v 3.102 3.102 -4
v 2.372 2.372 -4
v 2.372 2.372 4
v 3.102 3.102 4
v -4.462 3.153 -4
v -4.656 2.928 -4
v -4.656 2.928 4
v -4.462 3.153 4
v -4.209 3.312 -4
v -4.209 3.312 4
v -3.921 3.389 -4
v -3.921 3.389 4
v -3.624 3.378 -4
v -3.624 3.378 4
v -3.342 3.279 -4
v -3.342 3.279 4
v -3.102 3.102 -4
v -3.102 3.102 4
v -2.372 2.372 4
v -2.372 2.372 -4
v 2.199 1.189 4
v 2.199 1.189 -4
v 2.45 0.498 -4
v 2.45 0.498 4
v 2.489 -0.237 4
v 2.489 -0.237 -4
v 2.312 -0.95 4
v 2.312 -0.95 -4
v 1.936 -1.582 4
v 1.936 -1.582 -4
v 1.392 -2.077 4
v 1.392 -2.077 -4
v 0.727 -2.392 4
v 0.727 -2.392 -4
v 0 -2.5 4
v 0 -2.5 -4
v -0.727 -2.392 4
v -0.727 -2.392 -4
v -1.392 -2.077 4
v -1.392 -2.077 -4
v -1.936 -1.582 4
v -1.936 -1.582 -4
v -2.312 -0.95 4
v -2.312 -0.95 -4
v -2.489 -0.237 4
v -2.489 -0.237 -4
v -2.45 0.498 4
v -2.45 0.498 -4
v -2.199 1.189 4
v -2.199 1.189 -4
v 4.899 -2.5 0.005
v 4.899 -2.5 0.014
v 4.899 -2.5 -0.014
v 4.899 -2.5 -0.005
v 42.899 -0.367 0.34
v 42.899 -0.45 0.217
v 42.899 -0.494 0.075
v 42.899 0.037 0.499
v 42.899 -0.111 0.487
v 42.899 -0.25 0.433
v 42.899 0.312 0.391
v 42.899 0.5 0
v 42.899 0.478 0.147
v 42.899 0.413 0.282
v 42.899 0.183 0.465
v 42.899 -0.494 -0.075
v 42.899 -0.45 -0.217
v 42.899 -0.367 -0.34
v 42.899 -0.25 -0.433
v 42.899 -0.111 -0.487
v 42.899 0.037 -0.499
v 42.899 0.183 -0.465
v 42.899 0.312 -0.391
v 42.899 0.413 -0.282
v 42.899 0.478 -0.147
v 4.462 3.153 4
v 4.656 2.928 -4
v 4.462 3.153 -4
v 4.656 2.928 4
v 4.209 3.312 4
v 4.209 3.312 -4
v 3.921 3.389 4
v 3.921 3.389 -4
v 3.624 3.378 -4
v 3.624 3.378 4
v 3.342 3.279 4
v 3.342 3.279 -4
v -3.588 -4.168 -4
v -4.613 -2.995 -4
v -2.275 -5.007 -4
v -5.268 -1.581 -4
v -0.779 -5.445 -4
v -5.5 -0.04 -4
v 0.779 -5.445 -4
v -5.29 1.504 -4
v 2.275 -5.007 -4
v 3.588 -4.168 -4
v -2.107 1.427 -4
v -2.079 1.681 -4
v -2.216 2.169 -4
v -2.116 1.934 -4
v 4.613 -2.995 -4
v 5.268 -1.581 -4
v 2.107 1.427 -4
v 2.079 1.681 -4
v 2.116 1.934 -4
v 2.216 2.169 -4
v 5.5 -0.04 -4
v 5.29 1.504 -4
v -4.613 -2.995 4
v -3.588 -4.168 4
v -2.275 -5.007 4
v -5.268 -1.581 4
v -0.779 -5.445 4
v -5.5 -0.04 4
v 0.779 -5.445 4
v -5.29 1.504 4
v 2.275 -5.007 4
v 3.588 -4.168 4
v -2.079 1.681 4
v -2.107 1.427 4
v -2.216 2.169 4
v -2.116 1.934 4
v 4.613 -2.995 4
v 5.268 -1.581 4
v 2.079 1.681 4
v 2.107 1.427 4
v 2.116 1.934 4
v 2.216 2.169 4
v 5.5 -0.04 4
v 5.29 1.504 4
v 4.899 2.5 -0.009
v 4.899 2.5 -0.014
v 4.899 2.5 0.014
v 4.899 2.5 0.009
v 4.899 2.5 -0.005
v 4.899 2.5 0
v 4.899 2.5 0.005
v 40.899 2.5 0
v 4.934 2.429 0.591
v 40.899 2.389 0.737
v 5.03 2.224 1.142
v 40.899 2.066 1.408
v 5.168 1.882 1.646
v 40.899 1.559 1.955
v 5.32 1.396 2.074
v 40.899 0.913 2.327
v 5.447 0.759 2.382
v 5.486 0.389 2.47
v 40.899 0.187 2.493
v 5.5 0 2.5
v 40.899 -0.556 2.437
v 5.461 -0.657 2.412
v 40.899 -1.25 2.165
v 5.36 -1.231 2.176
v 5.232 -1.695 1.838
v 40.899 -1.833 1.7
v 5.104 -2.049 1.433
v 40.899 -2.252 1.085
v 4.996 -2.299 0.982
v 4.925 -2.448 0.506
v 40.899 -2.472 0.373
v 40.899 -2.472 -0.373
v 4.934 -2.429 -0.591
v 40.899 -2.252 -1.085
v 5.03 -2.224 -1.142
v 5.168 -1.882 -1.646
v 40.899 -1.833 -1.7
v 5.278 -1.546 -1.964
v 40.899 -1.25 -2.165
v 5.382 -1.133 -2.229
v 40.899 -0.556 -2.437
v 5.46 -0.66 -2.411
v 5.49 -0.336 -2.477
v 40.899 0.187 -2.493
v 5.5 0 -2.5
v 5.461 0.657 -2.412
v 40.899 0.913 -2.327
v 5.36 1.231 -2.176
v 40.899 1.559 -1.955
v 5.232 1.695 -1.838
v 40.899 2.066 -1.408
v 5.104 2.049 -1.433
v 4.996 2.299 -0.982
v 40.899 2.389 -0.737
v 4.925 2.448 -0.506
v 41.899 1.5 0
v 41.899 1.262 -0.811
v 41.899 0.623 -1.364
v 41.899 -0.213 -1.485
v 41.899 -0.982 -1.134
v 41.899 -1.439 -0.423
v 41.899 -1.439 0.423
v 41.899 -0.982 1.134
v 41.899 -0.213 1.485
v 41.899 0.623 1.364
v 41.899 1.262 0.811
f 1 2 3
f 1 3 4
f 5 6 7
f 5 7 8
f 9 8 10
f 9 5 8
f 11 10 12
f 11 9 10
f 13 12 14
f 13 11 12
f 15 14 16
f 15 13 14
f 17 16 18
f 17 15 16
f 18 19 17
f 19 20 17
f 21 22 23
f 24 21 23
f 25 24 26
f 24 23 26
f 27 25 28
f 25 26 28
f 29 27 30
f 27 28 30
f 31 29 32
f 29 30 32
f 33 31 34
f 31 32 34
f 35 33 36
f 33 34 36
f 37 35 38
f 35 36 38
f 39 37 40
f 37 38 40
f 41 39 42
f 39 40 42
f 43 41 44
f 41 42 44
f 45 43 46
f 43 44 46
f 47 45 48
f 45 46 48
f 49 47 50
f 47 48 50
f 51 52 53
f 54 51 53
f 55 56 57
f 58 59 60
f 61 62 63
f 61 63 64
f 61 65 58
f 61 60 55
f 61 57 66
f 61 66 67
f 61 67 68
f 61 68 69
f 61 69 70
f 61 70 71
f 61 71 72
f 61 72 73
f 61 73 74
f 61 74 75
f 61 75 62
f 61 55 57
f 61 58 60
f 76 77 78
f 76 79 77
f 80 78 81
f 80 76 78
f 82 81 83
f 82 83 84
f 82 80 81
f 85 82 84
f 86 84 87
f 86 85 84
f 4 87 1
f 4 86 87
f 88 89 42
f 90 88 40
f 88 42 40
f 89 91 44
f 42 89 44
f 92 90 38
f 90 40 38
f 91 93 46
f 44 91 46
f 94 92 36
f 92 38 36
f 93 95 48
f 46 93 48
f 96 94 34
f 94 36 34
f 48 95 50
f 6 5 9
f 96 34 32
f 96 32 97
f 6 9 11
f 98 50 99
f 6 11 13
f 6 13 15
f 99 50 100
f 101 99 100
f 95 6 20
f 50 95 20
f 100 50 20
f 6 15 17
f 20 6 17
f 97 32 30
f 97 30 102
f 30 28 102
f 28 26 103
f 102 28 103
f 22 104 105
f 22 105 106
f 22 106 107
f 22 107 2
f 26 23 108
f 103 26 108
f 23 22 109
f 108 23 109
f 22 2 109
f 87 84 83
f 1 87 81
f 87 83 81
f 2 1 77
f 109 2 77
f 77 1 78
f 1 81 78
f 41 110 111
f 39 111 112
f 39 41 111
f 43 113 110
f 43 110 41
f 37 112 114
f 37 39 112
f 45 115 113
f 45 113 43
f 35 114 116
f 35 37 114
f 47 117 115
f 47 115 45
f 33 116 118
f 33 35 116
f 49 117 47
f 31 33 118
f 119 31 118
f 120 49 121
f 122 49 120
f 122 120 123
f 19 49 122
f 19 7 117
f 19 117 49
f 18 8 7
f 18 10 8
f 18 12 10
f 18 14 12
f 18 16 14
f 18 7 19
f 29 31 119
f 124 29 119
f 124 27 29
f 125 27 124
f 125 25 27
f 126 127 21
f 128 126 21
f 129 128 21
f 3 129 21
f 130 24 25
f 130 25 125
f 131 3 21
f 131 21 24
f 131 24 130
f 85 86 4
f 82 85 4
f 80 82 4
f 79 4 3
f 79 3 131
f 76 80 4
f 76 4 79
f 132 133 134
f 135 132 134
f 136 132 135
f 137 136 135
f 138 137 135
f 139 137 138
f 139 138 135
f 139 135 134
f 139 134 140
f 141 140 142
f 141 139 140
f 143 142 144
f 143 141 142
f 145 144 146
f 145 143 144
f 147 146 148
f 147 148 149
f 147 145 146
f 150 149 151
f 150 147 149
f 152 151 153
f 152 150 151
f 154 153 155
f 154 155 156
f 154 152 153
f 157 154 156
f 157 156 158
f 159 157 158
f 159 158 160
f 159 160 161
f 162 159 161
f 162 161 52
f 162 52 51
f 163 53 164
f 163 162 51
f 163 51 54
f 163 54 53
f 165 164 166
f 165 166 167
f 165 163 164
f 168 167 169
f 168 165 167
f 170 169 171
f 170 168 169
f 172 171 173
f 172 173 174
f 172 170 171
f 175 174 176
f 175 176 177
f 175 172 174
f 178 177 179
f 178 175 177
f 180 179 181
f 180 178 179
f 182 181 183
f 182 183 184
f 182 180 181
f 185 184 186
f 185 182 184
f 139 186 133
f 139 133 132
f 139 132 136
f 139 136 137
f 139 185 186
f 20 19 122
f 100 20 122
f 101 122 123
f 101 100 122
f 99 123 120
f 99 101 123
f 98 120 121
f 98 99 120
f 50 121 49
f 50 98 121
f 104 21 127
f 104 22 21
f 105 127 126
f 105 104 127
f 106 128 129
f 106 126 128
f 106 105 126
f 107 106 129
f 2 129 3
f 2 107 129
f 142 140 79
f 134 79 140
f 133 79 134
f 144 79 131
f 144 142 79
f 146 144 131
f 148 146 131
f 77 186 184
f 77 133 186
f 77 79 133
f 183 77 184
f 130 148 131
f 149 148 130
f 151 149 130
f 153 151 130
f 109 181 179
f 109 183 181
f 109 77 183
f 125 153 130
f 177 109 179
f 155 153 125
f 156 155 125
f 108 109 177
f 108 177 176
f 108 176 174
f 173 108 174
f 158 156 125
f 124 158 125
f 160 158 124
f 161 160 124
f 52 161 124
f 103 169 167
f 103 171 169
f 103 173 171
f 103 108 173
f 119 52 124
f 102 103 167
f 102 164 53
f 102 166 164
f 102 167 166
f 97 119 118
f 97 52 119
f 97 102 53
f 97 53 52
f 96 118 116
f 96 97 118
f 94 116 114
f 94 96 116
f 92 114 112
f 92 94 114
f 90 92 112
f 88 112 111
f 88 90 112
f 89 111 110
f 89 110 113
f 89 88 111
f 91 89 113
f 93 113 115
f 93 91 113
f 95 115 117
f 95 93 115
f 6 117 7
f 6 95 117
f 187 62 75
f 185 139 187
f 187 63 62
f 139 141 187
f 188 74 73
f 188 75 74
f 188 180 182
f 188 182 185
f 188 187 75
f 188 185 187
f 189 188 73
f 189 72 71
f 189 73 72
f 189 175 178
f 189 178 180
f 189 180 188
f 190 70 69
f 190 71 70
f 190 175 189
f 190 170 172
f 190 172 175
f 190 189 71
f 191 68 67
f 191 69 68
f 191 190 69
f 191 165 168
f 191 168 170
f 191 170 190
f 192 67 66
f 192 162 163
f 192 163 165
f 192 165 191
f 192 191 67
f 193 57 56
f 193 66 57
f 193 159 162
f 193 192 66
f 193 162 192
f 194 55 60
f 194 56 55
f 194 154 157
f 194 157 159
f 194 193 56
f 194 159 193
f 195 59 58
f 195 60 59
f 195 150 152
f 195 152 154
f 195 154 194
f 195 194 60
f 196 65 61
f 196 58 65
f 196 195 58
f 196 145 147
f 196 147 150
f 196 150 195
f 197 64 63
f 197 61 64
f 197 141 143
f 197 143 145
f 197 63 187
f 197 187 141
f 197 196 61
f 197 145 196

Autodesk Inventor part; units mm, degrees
ref_plane "YZ Plane" through (0, 0, 0) normal (1, 0, 0) x (0, 1, 0)
ref_plane "XZ Plane" through (0, 0, 0) normal (0, 1, 0) x (-1, 0, 0)
ref_plane "XY Plane" through (0, 0, 0) normal (0, 0, 1) x (1, 0, 0)
sketch "Sketch1" plane through (0, 0, 0) normal (0, 0, 1) x (1, 0, 0)
  circle A0 centre (0, 0) radius 5.5
  circle A1 centre (0, 0) radius 2.5
  line L0 (0, 0) -> (0, 5.5) construction
  line L1 (0, 0) -> (-3.8891, 3.8891)
  line L2 (0, 0) -> (3.8891, 3.8891)
  point P0 (1.7678, 1.7678)
  point P1 (-1.7678, 1.7678)
  dimension "d0" = 5
  dimension "d1" = 3
  dimension "d2" = 45
  dimension "d3" = 45
extrude "Extrusion1" add sketch "Sketch1" along normal mid plane 8 contours A0 L1 A1 L2 picked at (-3.4581, 2.8281)
sketch "Sketch2" plane through (0, 0, 0) normal (0, 0, 1) x (1, 0, 0)
  arc A0 (-3.8891, 3.8891) -> (3.8891, 3.8891) centre (0, 0) ccw construction
  line L0 (4.899, 2.5) -> (42.899, 2.5)
  line L1 (42.899, 2.5) -> (42.899, -2.5)
  line L2 (42.899, -2.5) -> (4.899, -2.5)
  line L3 (4.899, -2.5) -> (4.899, 2.5)
  line L4 (0, 0) -> (42.899, 0)
  point P0 (4.899, 0)
  dimension "d6" = 38
  dimension "d7" = 5
revolve "Revolution1" add sketch "Sketch2" angle 360 about axis through (0, 0, 0) along (1, 0, 0) contours L0 L1 L4 L3
chamfer "Chamfer1" distance 2 angle 45 1 edges at (42.899, -2.5, 0)
fillet "Fillet3" radius 1 4 edges at (-3.8891, 3.8891, 0) (-1.7678, 1.7678, 0) (3.8891, 3.8891, 0) (1.7678, 1.7678, 0)
properties part number "Apple_logo_Black_Part2"
